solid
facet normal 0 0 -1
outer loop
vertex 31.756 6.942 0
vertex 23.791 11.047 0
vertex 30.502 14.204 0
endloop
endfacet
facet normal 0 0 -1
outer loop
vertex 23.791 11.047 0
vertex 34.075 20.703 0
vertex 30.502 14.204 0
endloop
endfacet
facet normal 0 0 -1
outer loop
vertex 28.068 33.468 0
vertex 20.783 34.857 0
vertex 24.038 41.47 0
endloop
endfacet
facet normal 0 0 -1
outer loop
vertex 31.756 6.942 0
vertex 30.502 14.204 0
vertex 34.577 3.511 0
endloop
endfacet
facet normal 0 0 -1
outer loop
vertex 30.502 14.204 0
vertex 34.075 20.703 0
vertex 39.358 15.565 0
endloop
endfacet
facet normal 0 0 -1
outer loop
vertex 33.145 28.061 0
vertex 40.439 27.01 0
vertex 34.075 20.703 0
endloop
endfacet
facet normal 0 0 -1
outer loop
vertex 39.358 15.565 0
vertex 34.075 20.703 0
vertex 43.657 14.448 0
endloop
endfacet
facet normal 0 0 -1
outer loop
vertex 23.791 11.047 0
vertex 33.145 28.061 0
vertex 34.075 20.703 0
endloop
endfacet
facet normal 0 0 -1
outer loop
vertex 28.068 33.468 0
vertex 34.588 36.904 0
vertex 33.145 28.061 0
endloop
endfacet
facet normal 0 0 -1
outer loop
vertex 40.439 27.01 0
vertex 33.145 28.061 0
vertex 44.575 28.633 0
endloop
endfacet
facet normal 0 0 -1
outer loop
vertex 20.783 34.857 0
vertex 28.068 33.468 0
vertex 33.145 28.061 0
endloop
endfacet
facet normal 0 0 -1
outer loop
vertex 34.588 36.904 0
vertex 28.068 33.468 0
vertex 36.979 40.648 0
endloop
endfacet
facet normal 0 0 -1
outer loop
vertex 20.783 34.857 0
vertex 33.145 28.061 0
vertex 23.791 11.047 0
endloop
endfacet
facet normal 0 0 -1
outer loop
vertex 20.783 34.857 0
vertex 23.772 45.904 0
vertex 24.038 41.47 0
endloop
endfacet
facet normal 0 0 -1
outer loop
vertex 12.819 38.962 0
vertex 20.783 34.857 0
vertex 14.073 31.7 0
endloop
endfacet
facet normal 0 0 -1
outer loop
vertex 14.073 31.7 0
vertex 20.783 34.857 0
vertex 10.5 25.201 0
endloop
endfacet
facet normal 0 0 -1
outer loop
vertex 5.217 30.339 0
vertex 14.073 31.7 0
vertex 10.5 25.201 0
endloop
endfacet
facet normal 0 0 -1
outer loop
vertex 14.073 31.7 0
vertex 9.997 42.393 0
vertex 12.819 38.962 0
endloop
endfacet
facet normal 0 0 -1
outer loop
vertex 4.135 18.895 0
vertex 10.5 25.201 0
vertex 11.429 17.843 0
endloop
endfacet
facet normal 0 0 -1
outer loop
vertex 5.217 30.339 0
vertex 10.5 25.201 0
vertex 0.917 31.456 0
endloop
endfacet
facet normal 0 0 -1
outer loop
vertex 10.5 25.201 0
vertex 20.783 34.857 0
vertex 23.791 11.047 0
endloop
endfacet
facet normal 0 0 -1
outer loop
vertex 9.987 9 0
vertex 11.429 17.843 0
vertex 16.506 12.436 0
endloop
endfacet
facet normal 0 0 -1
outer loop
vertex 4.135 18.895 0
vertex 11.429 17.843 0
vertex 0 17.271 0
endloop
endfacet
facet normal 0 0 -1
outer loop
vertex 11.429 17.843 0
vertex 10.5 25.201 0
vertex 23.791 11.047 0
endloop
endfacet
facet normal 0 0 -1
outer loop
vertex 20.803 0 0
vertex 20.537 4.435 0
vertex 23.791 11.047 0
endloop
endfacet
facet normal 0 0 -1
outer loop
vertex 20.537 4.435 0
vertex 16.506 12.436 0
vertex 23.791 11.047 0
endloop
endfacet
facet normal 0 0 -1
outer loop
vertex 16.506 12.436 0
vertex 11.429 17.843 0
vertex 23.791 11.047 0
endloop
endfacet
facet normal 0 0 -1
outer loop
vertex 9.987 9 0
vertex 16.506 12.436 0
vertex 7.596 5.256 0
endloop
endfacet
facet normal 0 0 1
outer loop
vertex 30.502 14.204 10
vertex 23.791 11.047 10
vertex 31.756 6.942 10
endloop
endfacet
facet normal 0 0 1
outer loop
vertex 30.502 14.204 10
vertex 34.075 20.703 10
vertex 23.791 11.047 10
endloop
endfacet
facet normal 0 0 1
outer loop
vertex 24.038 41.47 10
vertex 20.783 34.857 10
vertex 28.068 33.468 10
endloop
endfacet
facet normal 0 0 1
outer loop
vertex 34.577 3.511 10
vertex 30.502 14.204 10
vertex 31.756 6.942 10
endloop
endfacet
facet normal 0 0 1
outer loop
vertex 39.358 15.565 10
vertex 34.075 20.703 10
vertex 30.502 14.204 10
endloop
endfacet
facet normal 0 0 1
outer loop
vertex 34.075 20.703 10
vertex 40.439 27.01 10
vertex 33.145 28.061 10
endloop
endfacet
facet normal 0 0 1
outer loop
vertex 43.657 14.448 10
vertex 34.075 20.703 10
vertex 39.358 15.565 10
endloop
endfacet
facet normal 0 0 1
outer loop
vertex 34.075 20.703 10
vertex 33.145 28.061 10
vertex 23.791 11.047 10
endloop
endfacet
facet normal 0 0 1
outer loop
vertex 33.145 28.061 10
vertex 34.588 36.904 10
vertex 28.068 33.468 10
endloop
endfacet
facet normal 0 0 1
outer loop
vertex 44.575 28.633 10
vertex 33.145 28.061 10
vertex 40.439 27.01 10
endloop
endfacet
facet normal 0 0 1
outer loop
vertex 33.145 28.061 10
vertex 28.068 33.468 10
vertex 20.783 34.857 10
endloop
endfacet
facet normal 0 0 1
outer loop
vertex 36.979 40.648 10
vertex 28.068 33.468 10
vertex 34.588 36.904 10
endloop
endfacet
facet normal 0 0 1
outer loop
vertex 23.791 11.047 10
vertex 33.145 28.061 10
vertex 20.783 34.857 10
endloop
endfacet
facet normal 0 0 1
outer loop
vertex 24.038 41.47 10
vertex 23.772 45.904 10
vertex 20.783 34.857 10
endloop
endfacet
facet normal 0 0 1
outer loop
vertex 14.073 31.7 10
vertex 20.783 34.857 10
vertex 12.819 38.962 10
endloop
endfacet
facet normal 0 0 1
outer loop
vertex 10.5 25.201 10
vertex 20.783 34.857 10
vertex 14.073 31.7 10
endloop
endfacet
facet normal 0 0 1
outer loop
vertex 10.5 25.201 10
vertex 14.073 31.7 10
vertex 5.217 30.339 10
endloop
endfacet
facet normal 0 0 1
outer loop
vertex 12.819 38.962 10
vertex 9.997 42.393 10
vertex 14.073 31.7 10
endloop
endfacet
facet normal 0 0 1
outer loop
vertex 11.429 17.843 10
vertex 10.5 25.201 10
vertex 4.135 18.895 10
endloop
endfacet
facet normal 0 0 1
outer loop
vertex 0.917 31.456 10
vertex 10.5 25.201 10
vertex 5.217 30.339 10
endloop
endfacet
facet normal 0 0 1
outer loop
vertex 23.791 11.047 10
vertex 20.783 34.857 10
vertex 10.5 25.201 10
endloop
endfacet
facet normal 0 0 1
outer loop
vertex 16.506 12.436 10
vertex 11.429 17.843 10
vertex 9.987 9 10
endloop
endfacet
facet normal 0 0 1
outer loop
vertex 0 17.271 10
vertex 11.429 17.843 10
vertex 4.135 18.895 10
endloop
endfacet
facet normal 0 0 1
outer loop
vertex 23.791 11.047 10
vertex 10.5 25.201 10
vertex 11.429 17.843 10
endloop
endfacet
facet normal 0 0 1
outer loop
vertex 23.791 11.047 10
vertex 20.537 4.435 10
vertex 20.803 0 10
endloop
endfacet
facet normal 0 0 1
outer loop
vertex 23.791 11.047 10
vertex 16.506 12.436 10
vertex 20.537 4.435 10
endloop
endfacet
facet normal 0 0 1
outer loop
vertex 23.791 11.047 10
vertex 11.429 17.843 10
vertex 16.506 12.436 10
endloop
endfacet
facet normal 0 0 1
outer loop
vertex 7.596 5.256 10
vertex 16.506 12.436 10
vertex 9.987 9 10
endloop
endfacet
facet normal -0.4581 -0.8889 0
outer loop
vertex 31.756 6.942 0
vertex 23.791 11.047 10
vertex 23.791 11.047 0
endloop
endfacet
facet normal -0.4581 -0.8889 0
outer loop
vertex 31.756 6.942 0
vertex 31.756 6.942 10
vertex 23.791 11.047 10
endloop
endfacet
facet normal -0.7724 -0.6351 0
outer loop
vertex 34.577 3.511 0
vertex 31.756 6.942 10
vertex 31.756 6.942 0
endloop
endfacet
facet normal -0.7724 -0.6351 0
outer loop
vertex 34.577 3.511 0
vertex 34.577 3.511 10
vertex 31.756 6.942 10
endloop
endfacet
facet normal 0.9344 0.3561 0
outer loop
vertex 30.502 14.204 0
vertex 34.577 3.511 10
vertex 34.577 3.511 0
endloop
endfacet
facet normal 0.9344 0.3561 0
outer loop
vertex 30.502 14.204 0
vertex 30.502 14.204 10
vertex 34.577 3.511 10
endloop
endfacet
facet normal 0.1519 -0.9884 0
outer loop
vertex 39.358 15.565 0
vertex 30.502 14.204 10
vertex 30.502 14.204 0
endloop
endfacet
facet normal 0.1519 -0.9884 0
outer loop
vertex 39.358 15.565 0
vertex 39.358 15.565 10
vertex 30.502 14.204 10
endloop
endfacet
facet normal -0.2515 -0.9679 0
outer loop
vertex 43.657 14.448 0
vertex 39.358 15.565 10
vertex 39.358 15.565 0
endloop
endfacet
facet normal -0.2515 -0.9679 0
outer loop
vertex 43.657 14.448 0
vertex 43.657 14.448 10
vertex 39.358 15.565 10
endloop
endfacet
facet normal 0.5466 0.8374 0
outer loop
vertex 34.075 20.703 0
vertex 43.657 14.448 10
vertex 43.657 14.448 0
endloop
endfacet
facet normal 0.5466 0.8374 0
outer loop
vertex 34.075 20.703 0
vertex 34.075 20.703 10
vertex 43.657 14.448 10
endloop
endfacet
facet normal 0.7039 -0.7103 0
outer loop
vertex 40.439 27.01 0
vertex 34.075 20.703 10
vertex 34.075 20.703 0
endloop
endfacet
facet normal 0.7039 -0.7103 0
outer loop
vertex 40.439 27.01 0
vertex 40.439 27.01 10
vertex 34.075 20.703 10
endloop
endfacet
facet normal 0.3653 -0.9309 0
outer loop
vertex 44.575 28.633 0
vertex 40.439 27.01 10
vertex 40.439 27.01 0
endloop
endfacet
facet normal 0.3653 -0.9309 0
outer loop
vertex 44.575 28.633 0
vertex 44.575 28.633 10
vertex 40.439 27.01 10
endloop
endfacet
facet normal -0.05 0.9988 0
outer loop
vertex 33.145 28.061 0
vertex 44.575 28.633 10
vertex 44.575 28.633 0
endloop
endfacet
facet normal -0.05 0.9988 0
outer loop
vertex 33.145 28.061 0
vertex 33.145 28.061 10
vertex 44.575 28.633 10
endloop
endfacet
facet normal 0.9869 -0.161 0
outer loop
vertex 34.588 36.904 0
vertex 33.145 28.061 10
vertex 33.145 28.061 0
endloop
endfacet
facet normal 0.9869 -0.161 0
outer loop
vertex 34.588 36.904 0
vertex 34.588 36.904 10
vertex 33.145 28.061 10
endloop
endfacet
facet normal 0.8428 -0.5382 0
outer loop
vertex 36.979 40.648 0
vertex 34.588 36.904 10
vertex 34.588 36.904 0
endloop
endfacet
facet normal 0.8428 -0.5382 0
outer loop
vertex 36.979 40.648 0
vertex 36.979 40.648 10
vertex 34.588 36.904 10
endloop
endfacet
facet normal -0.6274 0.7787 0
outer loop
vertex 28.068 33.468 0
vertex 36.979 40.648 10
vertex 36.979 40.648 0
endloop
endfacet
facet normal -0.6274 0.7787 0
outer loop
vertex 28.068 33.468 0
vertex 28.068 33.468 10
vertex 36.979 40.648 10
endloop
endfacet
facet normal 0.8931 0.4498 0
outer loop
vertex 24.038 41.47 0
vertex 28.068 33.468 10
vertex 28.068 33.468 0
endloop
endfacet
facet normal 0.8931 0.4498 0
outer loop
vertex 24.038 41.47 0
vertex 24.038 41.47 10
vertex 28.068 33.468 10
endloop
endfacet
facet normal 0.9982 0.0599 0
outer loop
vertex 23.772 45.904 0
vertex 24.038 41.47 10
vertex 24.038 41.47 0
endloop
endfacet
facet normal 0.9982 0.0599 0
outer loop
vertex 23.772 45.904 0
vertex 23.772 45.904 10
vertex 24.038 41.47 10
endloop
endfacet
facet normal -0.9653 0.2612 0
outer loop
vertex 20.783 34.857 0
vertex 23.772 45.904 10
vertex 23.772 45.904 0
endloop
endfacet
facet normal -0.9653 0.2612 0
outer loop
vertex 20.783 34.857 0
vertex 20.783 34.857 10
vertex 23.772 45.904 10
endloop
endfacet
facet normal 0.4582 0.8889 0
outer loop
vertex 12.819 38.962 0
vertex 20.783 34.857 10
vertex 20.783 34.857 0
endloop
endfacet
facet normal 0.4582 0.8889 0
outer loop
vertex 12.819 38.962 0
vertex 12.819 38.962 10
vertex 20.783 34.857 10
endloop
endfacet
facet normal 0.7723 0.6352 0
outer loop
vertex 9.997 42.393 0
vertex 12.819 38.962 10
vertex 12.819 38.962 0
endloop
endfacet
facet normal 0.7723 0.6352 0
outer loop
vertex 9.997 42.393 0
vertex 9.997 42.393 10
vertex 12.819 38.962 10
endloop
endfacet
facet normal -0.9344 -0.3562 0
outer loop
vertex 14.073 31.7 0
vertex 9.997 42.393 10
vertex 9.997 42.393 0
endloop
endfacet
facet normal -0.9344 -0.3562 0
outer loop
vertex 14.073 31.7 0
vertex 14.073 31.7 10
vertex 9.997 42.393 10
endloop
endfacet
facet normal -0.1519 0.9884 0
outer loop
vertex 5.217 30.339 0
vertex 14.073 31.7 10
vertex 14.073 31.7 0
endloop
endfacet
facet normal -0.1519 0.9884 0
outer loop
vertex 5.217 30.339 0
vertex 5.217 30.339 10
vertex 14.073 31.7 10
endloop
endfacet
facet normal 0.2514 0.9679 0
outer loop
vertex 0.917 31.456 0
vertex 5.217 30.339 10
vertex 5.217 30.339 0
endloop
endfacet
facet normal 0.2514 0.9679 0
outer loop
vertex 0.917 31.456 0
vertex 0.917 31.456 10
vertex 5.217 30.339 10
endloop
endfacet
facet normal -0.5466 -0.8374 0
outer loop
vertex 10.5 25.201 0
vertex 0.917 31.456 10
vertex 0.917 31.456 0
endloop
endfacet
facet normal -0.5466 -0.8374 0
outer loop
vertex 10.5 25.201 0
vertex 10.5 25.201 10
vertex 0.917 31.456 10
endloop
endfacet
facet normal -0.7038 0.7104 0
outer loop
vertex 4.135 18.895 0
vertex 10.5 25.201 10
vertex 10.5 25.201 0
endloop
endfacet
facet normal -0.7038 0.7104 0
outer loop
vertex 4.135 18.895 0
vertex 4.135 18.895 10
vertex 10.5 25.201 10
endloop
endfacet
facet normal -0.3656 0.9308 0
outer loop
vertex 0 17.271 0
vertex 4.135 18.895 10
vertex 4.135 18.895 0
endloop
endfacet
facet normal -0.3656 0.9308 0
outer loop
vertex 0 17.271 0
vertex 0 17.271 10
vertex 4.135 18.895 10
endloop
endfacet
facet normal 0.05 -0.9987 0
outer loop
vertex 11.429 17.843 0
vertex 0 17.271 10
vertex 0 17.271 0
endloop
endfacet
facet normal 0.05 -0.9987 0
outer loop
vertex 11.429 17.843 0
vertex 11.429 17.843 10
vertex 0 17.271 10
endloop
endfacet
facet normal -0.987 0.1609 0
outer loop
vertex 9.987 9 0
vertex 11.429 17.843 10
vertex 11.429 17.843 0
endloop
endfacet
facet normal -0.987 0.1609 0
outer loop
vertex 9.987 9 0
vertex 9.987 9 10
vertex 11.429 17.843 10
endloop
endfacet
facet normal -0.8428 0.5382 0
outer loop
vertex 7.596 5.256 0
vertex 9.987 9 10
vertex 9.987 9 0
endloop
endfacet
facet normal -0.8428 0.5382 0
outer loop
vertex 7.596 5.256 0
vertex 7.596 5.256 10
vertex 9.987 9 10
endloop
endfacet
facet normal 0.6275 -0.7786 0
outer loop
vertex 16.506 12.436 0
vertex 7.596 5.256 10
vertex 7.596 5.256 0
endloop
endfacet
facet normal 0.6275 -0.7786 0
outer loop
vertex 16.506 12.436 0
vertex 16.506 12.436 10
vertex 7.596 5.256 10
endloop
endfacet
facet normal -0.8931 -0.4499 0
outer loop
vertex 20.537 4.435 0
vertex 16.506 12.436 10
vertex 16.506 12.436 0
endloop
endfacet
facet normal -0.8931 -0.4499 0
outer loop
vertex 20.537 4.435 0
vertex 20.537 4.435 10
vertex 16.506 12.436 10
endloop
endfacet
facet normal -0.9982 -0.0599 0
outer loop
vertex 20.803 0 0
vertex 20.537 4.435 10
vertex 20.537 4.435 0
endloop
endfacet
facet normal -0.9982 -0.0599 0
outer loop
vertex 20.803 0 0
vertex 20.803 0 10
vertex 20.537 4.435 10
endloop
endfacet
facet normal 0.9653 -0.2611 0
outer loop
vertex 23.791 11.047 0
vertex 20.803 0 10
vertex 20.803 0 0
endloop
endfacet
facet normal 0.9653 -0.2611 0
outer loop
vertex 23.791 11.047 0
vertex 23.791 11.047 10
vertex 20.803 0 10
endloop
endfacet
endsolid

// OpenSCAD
$fn = 32;

// ----------------------------------------------------------------------
// Fan rotor section: 10 blades, 12 mm hub radius, 11 mm blades
// ----------------------------------------------------------------------

// --- parameters (mm) ---
profile_height = 10;      // extrusion height
profile_points = 30;      // points of the closed outline

profile = [[34.075, 20.703], [40.439, 27.01], [44.575, 28.633], [33.145, 28.061], [34.588, 36.904], [36.979, 40.648], [28.068, 33.468], [24.038, 41.47], [23.772, 45.904], [20.783, 34.857], [12.819, 38.962], [9.997, 42.393], [14.073, 31.7], [5.217, 30.339], [0.917, 31.456], [10.5, 25.201], [4.135, 18.895], [0, 17.271], [11.429, 17.843], [9.987, 9], [7.596, 5.256], [16.506, 12.436], [20.537, 4.435], [20.803, 0], [23.791, 11.047], [31.756, 6.942], [34.577, 3.511], [30.502, 14.204], [39.358, 15.565], [43.657, 14.448]];  // single closed polygon, 30 points, counter clockwise

// --- the one profile operation ---
linear_extrude(height = profile_height) polygon(points = profile);
